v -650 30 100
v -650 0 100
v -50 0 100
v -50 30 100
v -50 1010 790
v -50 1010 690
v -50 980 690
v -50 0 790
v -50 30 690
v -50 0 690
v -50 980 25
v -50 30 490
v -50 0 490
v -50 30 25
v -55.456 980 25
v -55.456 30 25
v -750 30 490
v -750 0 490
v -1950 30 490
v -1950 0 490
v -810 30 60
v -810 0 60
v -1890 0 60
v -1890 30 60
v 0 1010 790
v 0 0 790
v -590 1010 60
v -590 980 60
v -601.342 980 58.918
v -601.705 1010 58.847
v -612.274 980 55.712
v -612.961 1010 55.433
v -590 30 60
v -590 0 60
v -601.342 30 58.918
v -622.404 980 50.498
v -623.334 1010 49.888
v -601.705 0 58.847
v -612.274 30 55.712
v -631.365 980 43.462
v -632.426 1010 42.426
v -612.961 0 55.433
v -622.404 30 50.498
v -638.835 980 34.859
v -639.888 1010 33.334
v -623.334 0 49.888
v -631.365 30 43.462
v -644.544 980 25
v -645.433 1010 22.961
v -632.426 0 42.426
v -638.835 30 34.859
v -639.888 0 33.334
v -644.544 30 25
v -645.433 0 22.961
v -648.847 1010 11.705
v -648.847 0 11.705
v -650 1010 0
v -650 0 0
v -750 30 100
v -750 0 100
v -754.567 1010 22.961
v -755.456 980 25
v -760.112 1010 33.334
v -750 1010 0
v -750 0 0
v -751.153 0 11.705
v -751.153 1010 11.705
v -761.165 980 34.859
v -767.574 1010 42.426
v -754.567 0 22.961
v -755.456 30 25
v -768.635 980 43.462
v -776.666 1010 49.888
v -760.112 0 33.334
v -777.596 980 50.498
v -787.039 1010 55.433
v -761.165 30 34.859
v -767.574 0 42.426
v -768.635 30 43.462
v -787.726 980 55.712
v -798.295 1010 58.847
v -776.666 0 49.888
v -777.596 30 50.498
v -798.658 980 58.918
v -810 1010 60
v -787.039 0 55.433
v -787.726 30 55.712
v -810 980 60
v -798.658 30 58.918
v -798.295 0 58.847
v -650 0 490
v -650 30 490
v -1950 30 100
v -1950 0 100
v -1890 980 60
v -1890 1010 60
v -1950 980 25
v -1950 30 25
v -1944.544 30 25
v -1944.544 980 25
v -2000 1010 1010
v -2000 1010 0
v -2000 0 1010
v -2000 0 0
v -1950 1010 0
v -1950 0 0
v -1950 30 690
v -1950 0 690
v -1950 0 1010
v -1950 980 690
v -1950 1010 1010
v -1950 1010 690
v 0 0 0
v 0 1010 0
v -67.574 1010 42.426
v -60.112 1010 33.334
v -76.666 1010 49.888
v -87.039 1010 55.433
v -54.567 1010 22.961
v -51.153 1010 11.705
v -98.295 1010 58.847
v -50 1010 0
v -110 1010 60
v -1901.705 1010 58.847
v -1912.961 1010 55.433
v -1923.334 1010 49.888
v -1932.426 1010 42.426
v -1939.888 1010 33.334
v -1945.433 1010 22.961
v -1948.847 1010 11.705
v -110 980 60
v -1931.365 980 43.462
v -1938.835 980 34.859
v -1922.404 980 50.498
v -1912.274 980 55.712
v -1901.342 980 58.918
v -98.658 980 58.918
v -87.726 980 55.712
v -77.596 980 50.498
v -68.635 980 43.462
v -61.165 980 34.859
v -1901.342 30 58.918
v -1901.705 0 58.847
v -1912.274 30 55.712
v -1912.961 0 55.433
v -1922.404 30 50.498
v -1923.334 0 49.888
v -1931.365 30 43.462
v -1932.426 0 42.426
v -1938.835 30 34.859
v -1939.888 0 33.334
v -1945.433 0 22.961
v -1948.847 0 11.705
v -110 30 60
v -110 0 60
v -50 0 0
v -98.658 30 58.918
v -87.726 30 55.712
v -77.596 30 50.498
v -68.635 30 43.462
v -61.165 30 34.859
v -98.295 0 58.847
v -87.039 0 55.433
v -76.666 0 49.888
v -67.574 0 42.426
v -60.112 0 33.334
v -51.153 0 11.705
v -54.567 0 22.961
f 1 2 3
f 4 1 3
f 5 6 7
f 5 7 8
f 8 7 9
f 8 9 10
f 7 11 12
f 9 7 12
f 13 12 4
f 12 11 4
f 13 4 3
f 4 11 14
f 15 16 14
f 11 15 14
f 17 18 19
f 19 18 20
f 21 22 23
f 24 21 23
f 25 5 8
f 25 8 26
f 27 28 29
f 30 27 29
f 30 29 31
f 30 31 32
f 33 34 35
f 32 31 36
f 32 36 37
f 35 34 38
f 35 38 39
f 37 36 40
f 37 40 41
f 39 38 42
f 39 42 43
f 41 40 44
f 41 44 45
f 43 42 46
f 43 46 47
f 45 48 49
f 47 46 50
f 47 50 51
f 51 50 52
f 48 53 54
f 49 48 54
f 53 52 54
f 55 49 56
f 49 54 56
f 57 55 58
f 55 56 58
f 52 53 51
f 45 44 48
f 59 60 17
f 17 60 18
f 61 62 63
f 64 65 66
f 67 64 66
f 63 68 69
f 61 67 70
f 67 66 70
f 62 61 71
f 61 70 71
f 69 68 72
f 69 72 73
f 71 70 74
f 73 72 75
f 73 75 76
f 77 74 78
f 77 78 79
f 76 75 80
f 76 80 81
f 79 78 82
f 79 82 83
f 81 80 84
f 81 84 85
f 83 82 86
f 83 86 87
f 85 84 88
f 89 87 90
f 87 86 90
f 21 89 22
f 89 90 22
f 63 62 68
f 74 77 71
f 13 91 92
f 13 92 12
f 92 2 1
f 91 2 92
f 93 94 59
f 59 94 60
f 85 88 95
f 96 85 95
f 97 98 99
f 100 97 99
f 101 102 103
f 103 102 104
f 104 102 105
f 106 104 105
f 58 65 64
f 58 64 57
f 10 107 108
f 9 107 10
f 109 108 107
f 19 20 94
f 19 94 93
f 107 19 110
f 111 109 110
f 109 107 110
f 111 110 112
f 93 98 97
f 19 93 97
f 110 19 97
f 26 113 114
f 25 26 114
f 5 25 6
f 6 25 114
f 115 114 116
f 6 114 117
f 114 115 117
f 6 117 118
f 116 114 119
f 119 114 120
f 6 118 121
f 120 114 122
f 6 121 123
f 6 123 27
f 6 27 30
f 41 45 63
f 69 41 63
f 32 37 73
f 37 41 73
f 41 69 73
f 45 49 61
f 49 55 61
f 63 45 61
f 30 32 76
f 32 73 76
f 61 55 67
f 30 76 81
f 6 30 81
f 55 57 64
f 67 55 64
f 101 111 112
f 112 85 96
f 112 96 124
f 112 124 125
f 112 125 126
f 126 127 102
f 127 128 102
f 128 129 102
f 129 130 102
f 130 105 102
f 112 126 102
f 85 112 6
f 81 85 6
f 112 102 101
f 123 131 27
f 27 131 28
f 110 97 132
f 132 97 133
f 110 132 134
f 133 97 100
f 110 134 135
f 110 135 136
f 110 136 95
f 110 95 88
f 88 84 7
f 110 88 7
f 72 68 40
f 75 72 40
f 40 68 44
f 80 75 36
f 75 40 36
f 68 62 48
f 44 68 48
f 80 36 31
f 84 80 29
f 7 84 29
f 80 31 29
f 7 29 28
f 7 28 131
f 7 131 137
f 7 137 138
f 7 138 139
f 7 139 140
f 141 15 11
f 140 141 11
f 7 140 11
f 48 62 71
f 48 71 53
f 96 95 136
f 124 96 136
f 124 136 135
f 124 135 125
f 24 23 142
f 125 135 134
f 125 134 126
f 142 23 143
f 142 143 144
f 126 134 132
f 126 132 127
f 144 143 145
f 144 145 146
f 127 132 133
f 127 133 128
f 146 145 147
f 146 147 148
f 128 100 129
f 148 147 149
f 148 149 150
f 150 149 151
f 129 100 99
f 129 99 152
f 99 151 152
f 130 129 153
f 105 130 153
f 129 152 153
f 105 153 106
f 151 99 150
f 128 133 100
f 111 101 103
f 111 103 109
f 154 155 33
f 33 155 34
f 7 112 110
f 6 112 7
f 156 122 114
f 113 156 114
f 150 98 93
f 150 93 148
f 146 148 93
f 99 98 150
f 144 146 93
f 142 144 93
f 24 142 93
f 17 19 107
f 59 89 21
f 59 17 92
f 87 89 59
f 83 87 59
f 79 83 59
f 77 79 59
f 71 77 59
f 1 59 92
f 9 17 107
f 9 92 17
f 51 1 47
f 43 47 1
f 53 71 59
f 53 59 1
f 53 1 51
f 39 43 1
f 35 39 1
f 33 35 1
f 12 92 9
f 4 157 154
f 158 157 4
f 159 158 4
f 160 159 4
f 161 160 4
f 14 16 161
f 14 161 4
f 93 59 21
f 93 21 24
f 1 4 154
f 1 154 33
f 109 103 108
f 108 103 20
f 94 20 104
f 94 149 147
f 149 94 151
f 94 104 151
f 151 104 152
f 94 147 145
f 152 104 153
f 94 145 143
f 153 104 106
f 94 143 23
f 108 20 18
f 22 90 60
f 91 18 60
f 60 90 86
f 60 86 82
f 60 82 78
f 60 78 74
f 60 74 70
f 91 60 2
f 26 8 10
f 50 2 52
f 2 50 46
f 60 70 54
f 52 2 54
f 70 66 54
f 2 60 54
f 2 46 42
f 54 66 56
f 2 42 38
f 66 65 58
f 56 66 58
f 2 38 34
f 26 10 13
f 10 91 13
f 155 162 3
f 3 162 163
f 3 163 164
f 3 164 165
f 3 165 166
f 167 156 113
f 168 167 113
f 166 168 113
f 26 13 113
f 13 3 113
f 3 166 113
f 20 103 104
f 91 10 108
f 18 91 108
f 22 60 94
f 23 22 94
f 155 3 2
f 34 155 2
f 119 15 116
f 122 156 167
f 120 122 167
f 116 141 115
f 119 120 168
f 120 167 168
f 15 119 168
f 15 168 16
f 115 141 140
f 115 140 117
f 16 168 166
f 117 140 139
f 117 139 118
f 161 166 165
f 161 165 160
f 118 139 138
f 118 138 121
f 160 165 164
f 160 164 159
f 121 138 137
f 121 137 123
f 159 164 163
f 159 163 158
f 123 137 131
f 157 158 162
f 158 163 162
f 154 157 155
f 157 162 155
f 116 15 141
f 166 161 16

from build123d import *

# Parameters (mm, degrees)
F0_W     = 1900
F0_H     = 30
F1_DEPTH = 690
F2_DEPTH = 1010
F0_H_2   = 950
F3_DEPTH = 25
F4_DEPTH = 790
F6_DEPTH = 1010
F5_W     = 600
F5_H     = 390
F7_DEPTH = 30


with BuildPart() as f1:
    # F0 (on Top) → F1 (new body)
    with BuildSketch(Plane.XY):
        with Locations((-1000, 995)):
            Rectangle(F0_W, F0_H)
        with Locations((-1000, 15)):
            Rectangle(F0_W, F0_H)
        Polygon((-1950, 1010), (-2000, 1010), (-2000, 0), (-1950, 0), (-1950, 30), (-1950, 980), align=None)
        Polygon((0, 1010), (-50, 1010), (-50, 980), (-50, 30), (-50, 0), (0, 0), align=None)
    extrude(amount=F1_DEPTH)

    # F0 (on Top) → F2 (join)
    with BuildSketch(Plane.XY):
        Polygon((-1950, 1010), (-2000, 1010), (-2000, 0), (-1950, 0), (-1950, 30), (-1950, 980), align=None)
    extrude(amount=F2_DEPTH)

    # F0 (on Top) → F3 (join)
    with BuildSketch(Plane.XY):
        with Locations((-1000, 505)):
            Rectangle(F0_W, F0_H_2)
    extrude(amount=F3_DEPTH)

    # F0 (on Top) → F4 (join)
    with BuildSketch(Plane.XY):
        Polygon((0, 1010), (-50, 1010), (-50, 980), (-50, 30), (-50, 0), (0, 0), align=None)
    extrude(amount=F4_DEPTH)

    # F5 (on face) → F6 (cut)
    with BuildSketch(Plane.XZ):
        with BuildLine():
            Line((-1950, 0), (-750, 0))
            ThreePointArc((-750, 0), (-767.573593, 42.426407), (-810, 60))
            Line((-810, 60), (-1890, 60))
            ThreePointArc((-1890, 60), (-1932.426407, 42.426407), (-1950, 0))
        make_face()
        with BuildLine():
            Line((-650, 0), (-50, 0))
            ThreePointArc((-50, 0), (-67.573593, 42.426407), (-110, 60))
            Line((-110, 60), (-590, 60))
            ThreePointArc((-590, 60), (-632.426407, 42.426407), (-650, 0))
        make_face()
    extrude(amount=-F6_DEPTH, mode=Mode.SUBTRACT)

    # F5 (on face) → F7 (cut)
    with BuildSketch(Plane.XZ):
        Polygon((-1439.458966, 490), (-1950, 490), (-1950, 100), (-1439.458966, 100), (-750, 100), (-750, 490), align=None)
        with Locations((-350, 295)):
            Rectangle(F5_W, F5_H)
    extrude(amount=-F7_DEPTH, mode=Mode.SUBTRACT)


solid = f1.part
